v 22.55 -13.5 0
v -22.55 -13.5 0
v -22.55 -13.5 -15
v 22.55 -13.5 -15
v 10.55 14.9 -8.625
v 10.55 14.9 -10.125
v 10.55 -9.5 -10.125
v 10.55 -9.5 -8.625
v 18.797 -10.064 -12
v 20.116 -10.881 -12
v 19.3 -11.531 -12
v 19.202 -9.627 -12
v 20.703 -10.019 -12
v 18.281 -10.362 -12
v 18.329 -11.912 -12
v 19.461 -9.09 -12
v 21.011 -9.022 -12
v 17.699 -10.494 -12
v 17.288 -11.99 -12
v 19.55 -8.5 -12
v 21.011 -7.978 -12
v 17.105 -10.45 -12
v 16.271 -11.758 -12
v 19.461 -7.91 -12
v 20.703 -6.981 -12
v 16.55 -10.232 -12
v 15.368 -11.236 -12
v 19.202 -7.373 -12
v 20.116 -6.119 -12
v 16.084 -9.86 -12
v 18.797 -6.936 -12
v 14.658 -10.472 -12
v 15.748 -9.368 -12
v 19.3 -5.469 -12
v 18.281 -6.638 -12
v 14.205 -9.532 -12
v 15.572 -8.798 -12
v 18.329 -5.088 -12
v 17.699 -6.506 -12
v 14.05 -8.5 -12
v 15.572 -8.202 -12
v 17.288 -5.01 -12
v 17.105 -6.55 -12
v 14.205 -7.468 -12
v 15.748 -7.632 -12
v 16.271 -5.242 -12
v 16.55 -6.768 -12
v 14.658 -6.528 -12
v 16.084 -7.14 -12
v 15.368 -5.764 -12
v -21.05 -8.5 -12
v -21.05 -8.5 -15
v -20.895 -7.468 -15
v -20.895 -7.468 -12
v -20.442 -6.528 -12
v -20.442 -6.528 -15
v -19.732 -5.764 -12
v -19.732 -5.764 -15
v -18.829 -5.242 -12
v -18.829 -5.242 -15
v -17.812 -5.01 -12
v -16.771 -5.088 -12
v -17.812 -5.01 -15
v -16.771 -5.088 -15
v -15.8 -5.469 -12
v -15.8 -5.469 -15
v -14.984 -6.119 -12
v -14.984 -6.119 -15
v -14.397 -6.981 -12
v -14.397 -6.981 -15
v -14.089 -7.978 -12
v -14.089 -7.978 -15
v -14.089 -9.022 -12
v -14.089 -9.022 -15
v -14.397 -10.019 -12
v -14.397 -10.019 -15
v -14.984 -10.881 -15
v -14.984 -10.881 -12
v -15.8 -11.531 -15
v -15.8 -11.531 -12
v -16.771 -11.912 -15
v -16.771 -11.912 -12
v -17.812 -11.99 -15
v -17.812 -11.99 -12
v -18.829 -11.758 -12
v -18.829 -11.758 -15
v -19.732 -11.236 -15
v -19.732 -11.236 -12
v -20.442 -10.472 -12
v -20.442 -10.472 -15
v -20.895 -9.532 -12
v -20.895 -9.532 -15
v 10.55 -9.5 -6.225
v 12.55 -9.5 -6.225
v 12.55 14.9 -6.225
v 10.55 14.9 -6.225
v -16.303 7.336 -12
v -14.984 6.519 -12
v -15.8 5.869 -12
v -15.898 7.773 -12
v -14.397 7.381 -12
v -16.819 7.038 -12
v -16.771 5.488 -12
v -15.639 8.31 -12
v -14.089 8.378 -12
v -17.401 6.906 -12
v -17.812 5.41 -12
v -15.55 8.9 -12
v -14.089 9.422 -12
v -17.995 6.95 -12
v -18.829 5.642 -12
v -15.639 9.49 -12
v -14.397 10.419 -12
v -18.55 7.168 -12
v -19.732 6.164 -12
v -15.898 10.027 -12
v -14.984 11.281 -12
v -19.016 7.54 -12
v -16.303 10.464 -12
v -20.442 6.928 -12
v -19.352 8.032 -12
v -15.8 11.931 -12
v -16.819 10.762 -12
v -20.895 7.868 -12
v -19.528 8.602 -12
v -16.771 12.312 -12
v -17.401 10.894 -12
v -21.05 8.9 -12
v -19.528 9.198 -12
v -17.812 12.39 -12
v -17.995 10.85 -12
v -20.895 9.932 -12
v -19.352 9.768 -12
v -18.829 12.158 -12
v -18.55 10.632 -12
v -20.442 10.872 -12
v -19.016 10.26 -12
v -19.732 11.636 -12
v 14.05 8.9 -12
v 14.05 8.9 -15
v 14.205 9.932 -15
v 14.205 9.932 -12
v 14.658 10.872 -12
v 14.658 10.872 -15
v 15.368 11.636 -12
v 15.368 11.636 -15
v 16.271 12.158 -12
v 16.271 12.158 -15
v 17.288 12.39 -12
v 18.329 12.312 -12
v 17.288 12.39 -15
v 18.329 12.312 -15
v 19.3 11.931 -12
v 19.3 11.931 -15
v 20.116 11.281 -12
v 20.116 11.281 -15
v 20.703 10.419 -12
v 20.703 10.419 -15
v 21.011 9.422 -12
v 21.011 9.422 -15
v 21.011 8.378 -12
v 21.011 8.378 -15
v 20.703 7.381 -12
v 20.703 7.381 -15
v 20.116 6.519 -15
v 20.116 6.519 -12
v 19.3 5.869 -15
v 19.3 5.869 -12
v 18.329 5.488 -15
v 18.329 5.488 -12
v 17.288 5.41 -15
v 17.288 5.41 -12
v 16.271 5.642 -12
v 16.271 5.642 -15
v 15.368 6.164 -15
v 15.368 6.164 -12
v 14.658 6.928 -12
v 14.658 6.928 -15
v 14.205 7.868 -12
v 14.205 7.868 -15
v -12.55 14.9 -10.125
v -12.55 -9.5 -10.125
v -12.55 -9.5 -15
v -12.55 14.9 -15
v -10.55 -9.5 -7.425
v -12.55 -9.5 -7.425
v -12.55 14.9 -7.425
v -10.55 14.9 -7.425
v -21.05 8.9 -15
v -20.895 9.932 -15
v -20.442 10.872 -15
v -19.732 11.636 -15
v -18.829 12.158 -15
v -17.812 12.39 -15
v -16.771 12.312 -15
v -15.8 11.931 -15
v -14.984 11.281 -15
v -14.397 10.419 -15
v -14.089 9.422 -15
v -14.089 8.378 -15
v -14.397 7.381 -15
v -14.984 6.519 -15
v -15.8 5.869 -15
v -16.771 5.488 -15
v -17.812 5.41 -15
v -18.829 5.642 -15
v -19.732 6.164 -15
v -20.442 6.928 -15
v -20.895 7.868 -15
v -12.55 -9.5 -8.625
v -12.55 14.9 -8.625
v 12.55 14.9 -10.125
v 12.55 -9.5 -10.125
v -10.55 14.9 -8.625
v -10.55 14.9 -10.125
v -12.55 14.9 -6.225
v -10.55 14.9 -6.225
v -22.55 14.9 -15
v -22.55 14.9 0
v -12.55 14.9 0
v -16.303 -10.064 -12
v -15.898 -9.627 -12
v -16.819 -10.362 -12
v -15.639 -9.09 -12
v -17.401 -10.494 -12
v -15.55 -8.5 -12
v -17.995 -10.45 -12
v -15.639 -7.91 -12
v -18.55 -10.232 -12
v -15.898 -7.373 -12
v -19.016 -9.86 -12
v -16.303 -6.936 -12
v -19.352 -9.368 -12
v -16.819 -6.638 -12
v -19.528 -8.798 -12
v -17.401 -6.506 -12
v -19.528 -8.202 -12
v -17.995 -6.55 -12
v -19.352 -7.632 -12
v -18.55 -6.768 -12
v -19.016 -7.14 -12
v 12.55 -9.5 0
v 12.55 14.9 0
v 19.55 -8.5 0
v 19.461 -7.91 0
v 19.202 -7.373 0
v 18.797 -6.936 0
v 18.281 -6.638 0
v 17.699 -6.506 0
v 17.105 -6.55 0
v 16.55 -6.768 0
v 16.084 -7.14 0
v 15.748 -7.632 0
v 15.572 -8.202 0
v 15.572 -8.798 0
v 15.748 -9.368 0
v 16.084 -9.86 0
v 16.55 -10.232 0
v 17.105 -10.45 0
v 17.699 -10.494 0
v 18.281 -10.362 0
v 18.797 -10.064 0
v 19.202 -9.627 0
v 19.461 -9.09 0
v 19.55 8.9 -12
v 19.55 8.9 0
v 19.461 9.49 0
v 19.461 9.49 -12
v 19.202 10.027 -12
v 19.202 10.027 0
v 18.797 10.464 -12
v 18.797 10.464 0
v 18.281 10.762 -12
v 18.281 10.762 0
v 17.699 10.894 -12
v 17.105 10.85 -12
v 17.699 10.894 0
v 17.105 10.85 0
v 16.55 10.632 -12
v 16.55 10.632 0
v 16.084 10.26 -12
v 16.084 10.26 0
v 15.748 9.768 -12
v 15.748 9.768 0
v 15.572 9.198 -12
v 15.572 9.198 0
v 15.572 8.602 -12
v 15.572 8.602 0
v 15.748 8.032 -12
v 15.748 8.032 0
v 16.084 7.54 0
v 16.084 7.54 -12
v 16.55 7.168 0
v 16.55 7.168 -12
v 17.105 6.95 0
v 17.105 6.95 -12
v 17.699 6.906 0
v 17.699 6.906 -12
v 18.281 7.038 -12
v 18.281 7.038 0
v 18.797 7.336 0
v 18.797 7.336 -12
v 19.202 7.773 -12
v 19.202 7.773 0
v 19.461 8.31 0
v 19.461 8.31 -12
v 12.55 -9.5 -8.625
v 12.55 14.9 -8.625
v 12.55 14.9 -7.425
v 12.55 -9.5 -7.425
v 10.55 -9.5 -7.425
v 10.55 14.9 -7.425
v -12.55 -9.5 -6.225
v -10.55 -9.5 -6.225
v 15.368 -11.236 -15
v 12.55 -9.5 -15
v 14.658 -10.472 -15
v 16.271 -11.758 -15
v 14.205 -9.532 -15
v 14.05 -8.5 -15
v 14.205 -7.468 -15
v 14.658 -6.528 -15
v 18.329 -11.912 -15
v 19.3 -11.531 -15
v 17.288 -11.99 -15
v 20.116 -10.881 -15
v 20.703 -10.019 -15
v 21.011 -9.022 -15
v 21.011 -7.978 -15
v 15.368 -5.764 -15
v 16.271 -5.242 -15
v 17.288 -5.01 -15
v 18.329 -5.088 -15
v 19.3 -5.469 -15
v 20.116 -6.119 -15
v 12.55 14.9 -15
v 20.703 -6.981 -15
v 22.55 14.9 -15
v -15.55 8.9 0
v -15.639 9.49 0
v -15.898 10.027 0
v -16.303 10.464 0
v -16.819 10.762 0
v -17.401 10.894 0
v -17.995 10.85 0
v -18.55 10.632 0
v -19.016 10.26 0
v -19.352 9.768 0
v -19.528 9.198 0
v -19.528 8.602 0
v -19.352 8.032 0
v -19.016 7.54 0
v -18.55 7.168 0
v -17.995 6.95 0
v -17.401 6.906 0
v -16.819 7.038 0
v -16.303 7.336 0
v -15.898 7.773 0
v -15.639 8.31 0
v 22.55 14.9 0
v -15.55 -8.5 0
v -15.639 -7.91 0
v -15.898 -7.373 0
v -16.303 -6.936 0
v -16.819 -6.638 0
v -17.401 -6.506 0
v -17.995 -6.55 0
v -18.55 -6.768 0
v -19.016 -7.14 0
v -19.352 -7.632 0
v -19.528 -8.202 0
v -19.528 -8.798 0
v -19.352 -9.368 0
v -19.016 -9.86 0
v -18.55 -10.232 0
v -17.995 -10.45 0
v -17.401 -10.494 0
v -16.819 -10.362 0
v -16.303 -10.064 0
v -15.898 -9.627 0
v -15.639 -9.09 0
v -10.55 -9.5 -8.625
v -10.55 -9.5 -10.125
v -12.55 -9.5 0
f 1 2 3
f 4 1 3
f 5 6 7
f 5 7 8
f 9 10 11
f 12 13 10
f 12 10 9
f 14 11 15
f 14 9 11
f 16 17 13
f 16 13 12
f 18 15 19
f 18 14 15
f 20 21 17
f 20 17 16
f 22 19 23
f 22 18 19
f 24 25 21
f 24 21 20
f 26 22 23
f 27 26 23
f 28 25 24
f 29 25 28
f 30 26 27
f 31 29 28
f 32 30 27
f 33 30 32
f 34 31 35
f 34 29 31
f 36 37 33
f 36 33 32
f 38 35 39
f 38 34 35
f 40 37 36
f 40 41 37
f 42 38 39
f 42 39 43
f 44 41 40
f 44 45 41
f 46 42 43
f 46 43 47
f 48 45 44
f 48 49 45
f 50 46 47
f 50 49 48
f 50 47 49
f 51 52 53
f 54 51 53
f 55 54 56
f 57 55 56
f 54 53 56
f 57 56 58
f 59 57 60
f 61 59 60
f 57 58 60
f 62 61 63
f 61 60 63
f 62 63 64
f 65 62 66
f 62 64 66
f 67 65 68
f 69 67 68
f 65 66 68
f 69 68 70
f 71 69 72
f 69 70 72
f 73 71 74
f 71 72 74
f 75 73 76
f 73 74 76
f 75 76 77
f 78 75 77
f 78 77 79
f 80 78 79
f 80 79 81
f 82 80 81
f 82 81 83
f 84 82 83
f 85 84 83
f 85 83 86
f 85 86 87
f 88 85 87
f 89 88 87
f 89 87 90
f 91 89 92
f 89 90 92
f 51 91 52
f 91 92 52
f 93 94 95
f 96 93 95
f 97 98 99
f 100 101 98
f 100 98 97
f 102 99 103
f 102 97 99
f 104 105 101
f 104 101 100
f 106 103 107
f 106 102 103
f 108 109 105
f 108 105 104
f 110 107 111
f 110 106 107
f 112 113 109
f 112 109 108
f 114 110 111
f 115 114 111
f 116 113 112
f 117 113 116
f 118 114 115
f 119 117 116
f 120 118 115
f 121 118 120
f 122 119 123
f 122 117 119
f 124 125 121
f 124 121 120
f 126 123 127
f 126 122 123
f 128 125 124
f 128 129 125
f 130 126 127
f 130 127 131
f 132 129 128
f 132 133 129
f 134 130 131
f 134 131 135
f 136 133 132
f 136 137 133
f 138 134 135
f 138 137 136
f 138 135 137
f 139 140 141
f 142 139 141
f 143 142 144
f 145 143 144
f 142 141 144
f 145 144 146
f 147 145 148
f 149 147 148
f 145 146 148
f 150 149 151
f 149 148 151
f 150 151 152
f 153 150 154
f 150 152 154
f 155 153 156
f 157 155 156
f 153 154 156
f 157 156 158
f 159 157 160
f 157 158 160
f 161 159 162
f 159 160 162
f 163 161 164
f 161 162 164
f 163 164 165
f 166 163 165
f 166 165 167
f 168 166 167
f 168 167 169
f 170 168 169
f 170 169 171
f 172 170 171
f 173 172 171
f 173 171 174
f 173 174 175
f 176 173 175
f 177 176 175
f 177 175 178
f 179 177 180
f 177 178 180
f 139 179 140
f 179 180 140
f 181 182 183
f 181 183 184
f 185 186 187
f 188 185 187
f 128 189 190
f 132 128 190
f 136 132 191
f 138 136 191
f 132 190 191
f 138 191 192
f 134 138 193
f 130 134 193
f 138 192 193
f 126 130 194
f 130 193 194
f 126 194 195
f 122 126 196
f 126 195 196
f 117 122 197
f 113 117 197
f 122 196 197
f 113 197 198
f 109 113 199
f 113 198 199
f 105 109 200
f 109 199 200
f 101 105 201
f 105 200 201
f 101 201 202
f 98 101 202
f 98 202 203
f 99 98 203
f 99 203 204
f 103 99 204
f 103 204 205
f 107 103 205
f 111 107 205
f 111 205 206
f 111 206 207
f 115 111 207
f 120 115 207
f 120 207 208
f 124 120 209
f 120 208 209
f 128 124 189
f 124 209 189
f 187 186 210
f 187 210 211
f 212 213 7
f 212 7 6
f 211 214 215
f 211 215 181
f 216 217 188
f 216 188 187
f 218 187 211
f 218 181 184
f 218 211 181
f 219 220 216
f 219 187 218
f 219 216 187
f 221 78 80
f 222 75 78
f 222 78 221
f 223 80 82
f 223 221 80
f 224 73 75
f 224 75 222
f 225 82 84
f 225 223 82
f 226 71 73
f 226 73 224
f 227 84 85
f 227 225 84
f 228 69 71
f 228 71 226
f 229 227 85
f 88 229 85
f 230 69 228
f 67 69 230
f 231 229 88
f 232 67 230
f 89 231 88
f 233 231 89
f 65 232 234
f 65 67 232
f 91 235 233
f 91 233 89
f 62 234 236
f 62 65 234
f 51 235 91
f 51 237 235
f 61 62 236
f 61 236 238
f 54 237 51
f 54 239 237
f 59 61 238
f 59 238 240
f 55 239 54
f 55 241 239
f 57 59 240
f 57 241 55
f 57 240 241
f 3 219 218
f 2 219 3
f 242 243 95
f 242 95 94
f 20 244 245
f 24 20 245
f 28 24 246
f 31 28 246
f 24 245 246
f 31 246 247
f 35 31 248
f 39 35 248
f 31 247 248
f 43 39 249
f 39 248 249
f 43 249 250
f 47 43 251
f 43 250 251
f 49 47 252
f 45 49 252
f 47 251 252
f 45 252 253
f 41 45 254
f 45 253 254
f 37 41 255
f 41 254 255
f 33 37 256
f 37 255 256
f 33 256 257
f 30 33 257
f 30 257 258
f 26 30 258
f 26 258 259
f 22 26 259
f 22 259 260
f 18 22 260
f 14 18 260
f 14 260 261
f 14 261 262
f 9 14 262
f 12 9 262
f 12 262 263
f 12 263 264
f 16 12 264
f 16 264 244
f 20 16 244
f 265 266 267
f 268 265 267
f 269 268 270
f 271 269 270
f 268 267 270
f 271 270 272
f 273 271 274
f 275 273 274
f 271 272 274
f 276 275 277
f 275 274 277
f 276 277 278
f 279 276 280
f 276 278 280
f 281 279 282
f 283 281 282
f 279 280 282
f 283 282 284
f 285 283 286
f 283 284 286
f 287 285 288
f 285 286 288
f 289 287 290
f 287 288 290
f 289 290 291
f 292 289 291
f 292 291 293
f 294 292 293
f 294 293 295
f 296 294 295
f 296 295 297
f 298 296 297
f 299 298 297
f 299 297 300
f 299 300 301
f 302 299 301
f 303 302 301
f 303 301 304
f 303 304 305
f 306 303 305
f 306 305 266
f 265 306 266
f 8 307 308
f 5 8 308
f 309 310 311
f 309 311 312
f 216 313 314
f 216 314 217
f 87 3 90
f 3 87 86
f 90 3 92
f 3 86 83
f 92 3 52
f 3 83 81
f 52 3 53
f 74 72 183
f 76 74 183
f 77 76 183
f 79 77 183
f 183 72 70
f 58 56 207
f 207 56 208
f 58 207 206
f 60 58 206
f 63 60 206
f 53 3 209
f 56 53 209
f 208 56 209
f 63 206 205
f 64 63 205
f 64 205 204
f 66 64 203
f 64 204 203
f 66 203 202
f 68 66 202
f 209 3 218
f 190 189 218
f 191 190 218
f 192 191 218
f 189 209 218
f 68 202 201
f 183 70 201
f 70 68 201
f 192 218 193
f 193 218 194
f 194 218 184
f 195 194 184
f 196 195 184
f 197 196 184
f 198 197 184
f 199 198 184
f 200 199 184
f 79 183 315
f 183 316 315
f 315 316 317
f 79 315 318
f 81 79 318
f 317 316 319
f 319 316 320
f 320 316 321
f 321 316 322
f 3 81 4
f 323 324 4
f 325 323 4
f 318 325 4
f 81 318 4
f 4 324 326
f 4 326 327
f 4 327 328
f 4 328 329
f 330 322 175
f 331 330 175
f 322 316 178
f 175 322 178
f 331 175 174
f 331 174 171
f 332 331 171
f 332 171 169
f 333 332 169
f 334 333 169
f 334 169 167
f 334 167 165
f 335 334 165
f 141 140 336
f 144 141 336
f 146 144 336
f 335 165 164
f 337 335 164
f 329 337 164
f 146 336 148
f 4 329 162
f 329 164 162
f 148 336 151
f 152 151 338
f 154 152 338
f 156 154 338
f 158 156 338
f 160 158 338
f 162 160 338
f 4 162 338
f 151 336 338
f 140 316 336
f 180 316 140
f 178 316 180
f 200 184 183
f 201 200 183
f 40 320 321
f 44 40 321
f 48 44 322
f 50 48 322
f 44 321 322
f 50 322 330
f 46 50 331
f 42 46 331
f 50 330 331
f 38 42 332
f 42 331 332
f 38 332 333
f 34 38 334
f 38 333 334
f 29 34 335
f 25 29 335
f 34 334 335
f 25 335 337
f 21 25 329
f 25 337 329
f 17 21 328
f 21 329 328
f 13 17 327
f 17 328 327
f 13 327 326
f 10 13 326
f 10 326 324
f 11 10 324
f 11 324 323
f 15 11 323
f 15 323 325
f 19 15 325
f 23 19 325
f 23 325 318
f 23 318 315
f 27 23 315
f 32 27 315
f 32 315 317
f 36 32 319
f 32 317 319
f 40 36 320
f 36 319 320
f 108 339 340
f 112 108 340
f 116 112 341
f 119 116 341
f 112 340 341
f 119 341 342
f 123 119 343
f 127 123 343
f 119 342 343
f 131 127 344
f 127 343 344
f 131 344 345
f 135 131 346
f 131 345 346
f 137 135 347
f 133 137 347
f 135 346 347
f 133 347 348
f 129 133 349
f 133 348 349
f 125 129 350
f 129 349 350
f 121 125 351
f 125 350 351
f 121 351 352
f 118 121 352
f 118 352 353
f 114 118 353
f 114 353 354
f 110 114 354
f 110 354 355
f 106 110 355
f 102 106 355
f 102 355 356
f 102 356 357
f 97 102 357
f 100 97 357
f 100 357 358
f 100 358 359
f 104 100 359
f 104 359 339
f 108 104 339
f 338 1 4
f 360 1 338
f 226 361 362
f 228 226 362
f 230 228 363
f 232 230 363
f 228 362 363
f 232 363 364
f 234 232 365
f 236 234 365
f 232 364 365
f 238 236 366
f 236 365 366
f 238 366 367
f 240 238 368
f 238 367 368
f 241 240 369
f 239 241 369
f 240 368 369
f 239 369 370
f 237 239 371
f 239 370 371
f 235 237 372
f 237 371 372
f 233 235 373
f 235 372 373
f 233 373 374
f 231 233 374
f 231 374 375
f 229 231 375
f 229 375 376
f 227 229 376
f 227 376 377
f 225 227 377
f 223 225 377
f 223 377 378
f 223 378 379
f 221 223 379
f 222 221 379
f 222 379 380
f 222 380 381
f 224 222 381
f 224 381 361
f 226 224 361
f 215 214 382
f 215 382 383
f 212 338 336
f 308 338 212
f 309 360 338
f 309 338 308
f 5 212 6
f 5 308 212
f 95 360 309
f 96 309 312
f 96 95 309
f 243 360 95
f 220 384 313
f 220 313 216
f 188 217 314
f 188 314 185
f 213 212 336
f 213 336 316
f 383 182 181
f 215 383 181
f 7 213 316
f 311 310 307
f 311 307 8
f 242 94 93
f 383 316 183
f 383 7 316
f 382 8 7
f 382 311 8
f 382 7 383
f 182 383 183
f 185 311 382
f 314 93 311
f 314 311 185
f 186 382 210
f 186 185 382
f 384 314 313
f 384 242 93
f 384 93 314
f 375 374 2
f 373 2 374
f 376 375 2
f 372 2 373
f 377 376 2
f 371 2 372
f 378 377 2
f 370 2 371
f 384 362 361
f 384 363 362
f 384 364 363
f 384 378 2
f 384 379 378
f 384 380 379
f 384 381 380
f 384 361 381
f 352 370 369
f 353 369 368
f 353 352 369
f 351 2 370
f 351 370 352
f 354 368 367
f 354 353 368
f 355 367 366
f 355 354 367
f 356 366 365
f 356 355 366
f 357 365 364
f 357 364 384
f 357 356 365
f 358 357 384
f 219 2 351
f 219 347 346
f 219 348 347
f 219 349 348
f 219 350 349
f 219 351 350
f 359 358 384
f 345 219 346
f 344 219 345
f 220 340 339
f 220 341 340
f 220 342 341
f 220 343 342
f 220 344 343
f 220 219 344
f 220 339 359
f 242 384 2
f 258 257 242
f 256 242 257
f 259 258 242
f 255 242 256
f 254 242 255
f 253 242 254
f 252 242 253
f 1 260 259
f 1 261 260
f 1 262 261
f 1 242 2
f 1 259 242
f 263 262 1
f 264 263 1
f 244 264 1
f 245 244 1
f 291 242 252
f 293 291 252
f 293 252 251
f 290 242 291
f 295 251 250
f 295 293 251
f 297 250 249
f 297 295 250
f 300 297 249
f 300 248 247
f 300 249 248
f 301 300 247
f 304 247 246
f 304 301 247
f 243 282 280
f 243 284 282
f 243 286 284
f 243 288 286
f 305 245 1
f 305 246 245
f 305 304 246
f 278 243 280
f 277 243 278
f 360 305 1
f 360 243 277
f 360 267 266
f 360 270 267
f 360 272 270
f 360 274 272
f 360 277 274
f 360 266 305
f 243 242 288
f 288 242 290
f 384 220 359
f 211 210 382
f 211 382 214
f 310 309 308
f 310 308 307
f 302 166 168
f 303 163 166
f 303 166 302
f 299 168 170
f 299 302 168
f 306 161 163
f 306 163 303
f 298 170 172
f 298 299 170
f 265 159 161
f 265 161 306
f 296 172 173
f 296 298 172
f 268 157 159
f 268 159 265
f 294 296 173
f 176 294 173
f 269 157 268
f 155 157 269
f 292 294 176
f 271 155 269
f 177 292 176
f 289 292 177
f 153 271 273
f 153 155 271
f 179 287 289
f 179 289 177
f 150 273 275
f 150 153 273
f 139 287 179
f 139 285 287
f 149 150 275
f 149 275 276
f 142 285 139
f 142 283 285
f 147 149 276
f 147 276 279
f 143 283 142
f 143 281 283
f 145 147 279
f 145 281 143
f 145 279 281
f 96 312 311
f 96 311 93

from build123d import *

# Parameters (mm, degrees)
ESQUISSE1_R             = 37
ESQUISSE1_R_2           = 1.5
ESQUISSE1_W             = 25
ESQUISSE1_H             = 3
BOSS_EXTRU_1_DEPTH      = 2
BOSS_EXTRU_2_DEPTH      = 15
ESQUISSE3_W             = 1.5
ESQUISSE3_H             = 28.4
ESQUISSE3_W_2           = 1.2
BOSS_EXTRU_3_DEPTH      = 2
ESQUISSE5_W             = 1.5
ESQUISSE5_H             = 24.4
ESQUISSE5_W_2           = 1.2
BOSS_EXTRU_4_DEPTH      = 2
ESQUISSE10_R            = 2
ENL_V_MAT_EXTRU_3_DEPTH = 49
ENL_V_START             = -2
ESQUISSE11_R            = 37
ENL_V_MAT_EXTRU_4_DEPTH = 2
SKETCH4_R               = 3.5
CUT_EXTRUDE2_DEPTH      = 3


with BuildPart() as part:
    # Esquisse1 → Boss.-Extru.1 (new body)
    with BuildSketch(Plane.XY):
        Circle(ESQUISSE1_R)
        with Locations((0, 30)):
            Circle(ESQUISSE1_R_2, mode=Mode.SUBTRACT)
        with Locations((-25.416453209, -15.9375)):
            Circle(ESQUISSE1_R_2, mode=Mode.SUBTRACT)
        with Locations((0, -27)):
            Circle(ESQUISSE1_R_2, mode=Mode.SUBTRACT)
        with Locations((25.416453209, -15.9375)):
            Circle(ESQUISSE1_R_2, mode=Mode.SUBTRACT)
        with Locations((0, -15.5)):
            Rectangle(ESQUISSE1_W, ESQUISSE1_H, mode=Mode.SUBTRACT)
    extrude(amount=BOSS_EXTRU_1_DEPTH)

    # Esquisse2 → Boss.-Extru.2 (add)
    with BuildSketch(Plane(origin=(0, 0, 0), x_dir=(-1, 0, 0), z_dir=(0, 0, -1))):
        Polygon((-22.55, 14.9), (-12.55, 14.9), (-12.55, -9.5), (12.55, -9.5), (12.55, 14.9), (22.55, 14.9), (22.55, -13.5), (-22.55, -13.5), align=None)
    extrude(amount=BOSS_EXTRU_2_DEPTH)

    # Esquisse3 → Boss.-Extru.3 (add)
    with BuildSketch(Plane(origin=(-12.55, 0, 0), x_dir=(0, 0, -1), z_dir=(1, 0, 0))):
        with Locations((9.375, 0.7)):
            Rectangle(ESQUISSE3_W, ESQUISSE3_H)
        with Locations((6.825, 0.7)):
            Rectangle(ESQUISSE3_W_2, ESQUISSE3_H)
    extrude(amount=BOSS_EXTRU_3_DEPTH)

    # Esquisse5 → Boss.-Extru.4 (add)
    with BuildSketch(Plane.ZY.offset(-12.55)):
        with Locations((-9.375, 2.7)):
            Rectangle(ESQUISSE5_W, ESQUISSE5_H)
        with Locations((-6.825, 2.7)):
            Rectangle(ESQUISSE5_W_2, ESQUISSE5_H)
    extrude(amount=BOSS_EXTRU_4_DEPTH)

    # Esquisse10 → Enlèv. mat.-Extru.3 (cut)
    with BuildSketch(Plane.XY.offset(2)):
        with Locations((-17.55, 8.9)):
            Circle(ESQUISSE10_R)
        with Locations((-17.55, -8.5)):
            Circle(ESQUISSE10_R)
        with Locations((17.55, -8.5)):
            Circle(ESQUISSE10_R)
        with Locations((17.55, 8.9)):
            Circle(ESQUISSE10_R)
    extrude(amount=-ENL_V_MAT_EXTRU_3_DEPTH, mode=Mode.SUBTRACT)

    # Esquisse11 → Enlèv. mat.-Extru.4 (cut)
    with BuildSketch(Plane.XY.offset(2).offset(ENL_V_START)):
        Circle(ESQUISSE11_R)
    extrude(amount=ENL_V_MAT_EXTRU_4_DEPTH, mode=Mode.SUBTRACT)

    # Sketch4 → Cut-Extrude2 (cut)
    with BuildSketch(Plane(origin=(0, 0, -15), x_dir=(-1, 0, 0), z_dir=(0, 0, -1))):
        with Locations((-17.55, -8.5)):
            Circle(SKETCH4_R)
        with Locations((-17.55, 8.9)):
            Circle(SKETCH4_R)
        with Locations((17.55, 8.9)):
            Circle(SKETCH4_R)
        with Locations((17.55, -8.5)):
            Circle(SKETCH4_R)
    extrude(amount=-CUT_EXTRUDE2_DEPTH, mode=Mode.SUBTRACT)


solid = part.part
